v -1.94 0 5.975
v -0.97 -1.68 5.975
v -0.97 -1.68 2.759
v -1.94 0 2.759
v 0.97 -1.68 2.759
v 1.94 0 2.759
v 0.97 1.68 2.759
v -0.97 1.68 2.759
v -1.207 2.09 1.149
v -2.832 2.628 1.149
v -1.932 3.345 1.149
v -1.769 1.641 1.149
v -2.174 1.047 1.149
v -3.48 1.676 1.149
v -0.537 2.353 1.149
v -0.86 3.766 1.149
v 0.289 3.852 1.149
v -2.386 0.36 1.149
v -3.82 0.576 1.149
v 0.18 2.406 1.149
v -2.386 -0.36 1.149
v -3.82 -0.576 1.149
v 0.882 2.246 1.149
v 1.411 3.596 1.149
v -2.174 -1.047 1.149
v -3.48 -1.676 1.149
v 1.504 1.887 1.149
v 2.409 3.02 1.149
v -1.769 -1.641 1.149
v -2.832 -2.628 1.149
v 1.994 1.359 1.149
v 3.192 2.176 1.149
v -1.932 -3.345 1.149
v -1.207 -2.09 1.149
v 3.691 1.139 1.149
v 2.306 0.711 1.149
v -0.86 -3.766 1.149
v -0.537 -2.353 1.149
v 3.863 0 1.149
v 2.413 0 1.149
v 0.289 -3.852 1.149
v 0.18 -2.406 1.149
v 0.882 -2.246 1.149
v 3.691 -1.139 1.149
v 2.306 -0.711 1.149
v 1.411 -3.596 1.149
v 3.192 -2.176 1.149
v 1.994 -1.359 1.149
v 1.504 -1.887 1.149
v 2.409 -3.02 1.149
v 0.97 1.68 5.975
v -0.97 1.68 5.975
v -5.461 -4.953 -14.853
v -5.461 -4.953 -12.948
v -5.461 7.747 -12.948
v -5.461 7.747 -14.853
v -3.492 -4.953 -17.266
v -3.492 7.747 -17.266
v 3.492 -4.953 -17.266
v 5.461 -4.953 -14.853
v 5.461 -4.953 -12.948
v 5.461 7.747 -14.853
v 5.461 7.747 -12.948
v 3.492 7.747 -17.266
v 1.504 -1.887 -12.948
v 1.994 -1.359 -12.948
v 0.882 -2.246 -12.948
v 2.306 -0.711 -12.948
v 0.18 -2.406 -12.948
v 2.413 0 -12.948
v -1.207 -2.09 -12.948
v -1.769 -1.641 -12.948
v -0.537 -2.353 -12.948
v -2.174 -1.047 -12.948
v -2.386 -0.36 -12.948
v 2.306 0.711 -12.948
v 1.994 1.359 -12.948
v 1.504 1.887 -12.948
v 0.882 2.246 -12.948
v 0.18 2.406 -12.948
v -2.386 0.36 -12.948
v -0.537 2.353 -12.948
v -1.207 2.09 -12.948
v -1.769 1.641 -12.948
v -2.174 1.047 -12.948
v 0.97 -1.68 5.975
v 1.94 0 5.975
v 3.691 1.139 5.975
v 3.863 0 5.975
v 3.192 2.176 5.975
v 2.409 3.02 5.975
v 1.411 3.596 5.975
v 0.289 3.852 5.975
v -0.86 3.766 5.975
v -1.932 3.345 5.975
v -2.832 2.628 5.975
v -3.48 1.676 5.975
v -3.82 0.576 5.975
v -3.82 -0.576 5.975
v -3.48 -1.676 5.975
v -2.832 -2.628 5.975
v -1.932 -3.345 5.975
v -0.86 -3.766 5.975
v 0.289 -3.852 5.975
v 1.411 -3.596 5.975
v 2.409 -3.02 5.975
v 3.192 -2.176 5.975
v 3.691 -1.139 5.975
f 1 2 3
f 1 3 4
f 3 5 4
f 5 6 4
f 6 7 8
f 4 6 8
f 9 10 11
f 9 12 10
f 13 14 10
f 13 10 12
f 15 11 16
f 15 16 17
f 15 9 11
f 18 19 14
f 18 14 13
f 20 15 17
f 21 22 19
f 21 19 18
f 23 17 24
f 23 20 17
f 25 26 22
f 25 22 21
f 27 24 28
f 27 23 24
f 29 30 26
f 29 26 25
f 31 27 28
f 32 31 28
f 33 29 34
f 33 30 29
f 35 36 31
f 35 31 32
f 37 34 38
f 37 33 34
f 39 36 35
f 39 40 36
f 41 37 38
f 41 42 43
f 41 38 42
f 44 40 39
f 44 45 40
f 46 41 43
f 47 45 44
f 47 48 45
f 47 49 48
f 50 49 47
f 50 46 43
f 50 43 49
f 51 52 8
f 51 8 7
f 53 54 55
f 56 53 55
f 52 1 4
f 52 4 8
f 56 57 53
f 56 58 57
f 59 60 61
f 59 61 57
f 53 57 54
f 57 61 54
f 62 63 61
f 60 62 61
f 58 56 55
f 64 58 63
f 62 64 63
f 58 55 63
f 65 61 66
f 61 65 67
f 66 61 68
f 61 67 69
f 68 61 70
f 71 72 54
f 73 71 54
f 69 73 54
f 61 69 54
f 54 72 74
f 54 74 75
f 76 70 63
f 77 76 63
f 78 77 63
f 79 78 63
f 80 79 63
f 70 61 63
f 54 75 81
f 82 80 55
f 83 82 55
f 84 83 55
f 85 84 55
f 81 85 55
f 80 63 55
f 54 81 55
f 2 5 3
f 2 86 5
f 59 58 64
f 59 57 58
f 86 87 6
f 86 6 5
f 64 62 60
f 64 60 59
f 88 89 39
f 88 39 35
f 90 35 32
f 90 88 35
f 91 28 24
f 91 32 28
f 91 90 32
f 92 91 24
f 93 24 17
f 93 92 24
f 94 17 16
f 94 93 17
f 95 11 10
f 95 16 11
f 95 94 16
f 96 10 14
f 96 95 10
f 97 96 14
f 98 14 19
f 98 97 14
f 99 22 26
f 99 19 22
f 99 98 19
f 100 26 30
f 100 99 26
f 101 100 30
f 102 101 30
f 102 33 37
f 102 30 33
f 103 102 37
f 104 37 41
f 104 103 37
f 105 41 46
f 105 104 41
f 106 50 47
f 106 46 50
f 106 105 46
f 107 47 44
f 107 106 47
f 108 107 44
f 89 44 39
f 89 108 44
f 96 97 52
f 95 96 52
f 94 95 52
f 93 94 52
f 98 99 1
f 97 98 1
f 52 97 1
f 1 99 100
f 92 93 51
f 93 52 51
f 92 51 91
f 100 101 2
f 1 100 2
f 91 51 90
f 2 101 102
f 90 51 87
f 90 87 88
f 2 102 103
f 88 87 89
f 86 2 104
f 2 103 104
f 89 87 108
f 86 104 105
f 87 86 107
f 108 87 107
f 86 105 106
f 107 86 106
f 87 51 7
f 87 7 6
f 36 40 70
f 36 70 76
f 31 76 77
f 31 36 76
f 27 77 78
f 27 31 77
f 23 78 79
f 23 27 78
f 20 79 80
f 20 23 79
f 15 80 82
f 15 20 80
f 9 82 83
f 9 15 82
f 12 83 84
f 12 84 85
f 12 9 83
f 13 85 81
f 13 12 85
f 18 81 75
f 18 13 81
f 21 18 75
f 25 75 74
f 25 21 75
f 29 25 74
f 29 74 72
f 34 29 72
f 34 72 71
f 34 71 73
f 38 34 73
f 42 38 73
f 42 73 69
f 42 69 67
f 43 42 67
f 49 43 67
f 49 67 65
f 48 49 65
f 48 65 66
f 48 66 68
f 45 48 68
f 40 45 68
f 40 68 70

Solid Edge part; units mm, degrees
sketch "Sketch1" plane through (0, 0, 0) normal (0, -1, 0) x (1, 0, 0)
  line L0 (0, -17.2662) -> (2.413, -17.2662)
  line L1 (2.413, -17.2662) -> (2.413, 1.1488)
  line L2 (2.413, 1.1488) -> (3.863, 1.1488)
  line L3 (3.863, 1.1488) -> (3.863, 5.9748)
  line L4 (3.863, 5.9748) -> (0, 5.9748)
revolve "RevolvedProtrusion1" add sketch "Sketch1" angle 360 about axis through (0, 0, 5.9748) along (0, 0, -1)
sketch "Sketch2" plane through (0, 0, 5.9748) normal (0, 0, 1) x (1, 0, 0)
  line L0 (-1.9403, 0) -> (-0.9702, 1.6804)
  line L1 (-0.9702, 1.6804) -> (0.9702, 1.6804)
  line L2 (0.9702, 1.6804) -> (1.9403, 0)
  line L3 (1.9403, 0) -> (0.9702, -1.6804)
  line L4 (0.9702, -1.6804) -> (-0.9702, -1.6804)
  line L5 (-0.9702, -1.6804) -> (-1.9403, 0)
extrude "Cutout1" cut sketch "Sketch2" against normal blind 3.2156
sketch "Sketch3" plane through (0, 0, -12.9482) normal (0, 0, -1) x (0, -1, 0)
  line L0 (4.953, 0) -> (4.953, 5.461)
  line L1 (4.953, 5.461) -> (-7.747, 5.461)
  line L2 (-7.747, 5.461) -> (-7.747, -5.461)
  line L3 (-7.747, -5.461) -> (4.953, -5.461)
  line L4 (4.953, -5.461) -> (4.953, 0)
extrude "Protrusion1" add sketch "Sketch3" along normal up to vertex (4.318 mm away)
sketch "Sketch4" plane through (0, 7.747, -15.1072) normal (0, 1, 0) x (-1, 0, 0)
  line L0 (0, -2.159) -> (3.4925, -2.159)
  line L1 (3.4925, -2.159) -> (5.461, 0.254)
  line L2 (5.461, 0.254) -> (6.5845, 0.254)
  line L3 (6.5845, -3.7102) -> (6.5845, 0.254)
  line L4 (-7.3862, -3.7102) -> (6.5845, -3.7102)
  line L5 (-7.3862, 0.254) -> (-7.3862, -3.7102)
  line L6 (-5.461, 0.254) -> (-7.3862, 0.254)
  line L7 (-5.461, 0.254) -> (-3.4925, -2.159)
  line L8 (0, -2.159) -> (-3.4925, -2.159)
extrude "ExtrudedCutout_2" cut sketch "Sketch4" against normal blind 371.1855
